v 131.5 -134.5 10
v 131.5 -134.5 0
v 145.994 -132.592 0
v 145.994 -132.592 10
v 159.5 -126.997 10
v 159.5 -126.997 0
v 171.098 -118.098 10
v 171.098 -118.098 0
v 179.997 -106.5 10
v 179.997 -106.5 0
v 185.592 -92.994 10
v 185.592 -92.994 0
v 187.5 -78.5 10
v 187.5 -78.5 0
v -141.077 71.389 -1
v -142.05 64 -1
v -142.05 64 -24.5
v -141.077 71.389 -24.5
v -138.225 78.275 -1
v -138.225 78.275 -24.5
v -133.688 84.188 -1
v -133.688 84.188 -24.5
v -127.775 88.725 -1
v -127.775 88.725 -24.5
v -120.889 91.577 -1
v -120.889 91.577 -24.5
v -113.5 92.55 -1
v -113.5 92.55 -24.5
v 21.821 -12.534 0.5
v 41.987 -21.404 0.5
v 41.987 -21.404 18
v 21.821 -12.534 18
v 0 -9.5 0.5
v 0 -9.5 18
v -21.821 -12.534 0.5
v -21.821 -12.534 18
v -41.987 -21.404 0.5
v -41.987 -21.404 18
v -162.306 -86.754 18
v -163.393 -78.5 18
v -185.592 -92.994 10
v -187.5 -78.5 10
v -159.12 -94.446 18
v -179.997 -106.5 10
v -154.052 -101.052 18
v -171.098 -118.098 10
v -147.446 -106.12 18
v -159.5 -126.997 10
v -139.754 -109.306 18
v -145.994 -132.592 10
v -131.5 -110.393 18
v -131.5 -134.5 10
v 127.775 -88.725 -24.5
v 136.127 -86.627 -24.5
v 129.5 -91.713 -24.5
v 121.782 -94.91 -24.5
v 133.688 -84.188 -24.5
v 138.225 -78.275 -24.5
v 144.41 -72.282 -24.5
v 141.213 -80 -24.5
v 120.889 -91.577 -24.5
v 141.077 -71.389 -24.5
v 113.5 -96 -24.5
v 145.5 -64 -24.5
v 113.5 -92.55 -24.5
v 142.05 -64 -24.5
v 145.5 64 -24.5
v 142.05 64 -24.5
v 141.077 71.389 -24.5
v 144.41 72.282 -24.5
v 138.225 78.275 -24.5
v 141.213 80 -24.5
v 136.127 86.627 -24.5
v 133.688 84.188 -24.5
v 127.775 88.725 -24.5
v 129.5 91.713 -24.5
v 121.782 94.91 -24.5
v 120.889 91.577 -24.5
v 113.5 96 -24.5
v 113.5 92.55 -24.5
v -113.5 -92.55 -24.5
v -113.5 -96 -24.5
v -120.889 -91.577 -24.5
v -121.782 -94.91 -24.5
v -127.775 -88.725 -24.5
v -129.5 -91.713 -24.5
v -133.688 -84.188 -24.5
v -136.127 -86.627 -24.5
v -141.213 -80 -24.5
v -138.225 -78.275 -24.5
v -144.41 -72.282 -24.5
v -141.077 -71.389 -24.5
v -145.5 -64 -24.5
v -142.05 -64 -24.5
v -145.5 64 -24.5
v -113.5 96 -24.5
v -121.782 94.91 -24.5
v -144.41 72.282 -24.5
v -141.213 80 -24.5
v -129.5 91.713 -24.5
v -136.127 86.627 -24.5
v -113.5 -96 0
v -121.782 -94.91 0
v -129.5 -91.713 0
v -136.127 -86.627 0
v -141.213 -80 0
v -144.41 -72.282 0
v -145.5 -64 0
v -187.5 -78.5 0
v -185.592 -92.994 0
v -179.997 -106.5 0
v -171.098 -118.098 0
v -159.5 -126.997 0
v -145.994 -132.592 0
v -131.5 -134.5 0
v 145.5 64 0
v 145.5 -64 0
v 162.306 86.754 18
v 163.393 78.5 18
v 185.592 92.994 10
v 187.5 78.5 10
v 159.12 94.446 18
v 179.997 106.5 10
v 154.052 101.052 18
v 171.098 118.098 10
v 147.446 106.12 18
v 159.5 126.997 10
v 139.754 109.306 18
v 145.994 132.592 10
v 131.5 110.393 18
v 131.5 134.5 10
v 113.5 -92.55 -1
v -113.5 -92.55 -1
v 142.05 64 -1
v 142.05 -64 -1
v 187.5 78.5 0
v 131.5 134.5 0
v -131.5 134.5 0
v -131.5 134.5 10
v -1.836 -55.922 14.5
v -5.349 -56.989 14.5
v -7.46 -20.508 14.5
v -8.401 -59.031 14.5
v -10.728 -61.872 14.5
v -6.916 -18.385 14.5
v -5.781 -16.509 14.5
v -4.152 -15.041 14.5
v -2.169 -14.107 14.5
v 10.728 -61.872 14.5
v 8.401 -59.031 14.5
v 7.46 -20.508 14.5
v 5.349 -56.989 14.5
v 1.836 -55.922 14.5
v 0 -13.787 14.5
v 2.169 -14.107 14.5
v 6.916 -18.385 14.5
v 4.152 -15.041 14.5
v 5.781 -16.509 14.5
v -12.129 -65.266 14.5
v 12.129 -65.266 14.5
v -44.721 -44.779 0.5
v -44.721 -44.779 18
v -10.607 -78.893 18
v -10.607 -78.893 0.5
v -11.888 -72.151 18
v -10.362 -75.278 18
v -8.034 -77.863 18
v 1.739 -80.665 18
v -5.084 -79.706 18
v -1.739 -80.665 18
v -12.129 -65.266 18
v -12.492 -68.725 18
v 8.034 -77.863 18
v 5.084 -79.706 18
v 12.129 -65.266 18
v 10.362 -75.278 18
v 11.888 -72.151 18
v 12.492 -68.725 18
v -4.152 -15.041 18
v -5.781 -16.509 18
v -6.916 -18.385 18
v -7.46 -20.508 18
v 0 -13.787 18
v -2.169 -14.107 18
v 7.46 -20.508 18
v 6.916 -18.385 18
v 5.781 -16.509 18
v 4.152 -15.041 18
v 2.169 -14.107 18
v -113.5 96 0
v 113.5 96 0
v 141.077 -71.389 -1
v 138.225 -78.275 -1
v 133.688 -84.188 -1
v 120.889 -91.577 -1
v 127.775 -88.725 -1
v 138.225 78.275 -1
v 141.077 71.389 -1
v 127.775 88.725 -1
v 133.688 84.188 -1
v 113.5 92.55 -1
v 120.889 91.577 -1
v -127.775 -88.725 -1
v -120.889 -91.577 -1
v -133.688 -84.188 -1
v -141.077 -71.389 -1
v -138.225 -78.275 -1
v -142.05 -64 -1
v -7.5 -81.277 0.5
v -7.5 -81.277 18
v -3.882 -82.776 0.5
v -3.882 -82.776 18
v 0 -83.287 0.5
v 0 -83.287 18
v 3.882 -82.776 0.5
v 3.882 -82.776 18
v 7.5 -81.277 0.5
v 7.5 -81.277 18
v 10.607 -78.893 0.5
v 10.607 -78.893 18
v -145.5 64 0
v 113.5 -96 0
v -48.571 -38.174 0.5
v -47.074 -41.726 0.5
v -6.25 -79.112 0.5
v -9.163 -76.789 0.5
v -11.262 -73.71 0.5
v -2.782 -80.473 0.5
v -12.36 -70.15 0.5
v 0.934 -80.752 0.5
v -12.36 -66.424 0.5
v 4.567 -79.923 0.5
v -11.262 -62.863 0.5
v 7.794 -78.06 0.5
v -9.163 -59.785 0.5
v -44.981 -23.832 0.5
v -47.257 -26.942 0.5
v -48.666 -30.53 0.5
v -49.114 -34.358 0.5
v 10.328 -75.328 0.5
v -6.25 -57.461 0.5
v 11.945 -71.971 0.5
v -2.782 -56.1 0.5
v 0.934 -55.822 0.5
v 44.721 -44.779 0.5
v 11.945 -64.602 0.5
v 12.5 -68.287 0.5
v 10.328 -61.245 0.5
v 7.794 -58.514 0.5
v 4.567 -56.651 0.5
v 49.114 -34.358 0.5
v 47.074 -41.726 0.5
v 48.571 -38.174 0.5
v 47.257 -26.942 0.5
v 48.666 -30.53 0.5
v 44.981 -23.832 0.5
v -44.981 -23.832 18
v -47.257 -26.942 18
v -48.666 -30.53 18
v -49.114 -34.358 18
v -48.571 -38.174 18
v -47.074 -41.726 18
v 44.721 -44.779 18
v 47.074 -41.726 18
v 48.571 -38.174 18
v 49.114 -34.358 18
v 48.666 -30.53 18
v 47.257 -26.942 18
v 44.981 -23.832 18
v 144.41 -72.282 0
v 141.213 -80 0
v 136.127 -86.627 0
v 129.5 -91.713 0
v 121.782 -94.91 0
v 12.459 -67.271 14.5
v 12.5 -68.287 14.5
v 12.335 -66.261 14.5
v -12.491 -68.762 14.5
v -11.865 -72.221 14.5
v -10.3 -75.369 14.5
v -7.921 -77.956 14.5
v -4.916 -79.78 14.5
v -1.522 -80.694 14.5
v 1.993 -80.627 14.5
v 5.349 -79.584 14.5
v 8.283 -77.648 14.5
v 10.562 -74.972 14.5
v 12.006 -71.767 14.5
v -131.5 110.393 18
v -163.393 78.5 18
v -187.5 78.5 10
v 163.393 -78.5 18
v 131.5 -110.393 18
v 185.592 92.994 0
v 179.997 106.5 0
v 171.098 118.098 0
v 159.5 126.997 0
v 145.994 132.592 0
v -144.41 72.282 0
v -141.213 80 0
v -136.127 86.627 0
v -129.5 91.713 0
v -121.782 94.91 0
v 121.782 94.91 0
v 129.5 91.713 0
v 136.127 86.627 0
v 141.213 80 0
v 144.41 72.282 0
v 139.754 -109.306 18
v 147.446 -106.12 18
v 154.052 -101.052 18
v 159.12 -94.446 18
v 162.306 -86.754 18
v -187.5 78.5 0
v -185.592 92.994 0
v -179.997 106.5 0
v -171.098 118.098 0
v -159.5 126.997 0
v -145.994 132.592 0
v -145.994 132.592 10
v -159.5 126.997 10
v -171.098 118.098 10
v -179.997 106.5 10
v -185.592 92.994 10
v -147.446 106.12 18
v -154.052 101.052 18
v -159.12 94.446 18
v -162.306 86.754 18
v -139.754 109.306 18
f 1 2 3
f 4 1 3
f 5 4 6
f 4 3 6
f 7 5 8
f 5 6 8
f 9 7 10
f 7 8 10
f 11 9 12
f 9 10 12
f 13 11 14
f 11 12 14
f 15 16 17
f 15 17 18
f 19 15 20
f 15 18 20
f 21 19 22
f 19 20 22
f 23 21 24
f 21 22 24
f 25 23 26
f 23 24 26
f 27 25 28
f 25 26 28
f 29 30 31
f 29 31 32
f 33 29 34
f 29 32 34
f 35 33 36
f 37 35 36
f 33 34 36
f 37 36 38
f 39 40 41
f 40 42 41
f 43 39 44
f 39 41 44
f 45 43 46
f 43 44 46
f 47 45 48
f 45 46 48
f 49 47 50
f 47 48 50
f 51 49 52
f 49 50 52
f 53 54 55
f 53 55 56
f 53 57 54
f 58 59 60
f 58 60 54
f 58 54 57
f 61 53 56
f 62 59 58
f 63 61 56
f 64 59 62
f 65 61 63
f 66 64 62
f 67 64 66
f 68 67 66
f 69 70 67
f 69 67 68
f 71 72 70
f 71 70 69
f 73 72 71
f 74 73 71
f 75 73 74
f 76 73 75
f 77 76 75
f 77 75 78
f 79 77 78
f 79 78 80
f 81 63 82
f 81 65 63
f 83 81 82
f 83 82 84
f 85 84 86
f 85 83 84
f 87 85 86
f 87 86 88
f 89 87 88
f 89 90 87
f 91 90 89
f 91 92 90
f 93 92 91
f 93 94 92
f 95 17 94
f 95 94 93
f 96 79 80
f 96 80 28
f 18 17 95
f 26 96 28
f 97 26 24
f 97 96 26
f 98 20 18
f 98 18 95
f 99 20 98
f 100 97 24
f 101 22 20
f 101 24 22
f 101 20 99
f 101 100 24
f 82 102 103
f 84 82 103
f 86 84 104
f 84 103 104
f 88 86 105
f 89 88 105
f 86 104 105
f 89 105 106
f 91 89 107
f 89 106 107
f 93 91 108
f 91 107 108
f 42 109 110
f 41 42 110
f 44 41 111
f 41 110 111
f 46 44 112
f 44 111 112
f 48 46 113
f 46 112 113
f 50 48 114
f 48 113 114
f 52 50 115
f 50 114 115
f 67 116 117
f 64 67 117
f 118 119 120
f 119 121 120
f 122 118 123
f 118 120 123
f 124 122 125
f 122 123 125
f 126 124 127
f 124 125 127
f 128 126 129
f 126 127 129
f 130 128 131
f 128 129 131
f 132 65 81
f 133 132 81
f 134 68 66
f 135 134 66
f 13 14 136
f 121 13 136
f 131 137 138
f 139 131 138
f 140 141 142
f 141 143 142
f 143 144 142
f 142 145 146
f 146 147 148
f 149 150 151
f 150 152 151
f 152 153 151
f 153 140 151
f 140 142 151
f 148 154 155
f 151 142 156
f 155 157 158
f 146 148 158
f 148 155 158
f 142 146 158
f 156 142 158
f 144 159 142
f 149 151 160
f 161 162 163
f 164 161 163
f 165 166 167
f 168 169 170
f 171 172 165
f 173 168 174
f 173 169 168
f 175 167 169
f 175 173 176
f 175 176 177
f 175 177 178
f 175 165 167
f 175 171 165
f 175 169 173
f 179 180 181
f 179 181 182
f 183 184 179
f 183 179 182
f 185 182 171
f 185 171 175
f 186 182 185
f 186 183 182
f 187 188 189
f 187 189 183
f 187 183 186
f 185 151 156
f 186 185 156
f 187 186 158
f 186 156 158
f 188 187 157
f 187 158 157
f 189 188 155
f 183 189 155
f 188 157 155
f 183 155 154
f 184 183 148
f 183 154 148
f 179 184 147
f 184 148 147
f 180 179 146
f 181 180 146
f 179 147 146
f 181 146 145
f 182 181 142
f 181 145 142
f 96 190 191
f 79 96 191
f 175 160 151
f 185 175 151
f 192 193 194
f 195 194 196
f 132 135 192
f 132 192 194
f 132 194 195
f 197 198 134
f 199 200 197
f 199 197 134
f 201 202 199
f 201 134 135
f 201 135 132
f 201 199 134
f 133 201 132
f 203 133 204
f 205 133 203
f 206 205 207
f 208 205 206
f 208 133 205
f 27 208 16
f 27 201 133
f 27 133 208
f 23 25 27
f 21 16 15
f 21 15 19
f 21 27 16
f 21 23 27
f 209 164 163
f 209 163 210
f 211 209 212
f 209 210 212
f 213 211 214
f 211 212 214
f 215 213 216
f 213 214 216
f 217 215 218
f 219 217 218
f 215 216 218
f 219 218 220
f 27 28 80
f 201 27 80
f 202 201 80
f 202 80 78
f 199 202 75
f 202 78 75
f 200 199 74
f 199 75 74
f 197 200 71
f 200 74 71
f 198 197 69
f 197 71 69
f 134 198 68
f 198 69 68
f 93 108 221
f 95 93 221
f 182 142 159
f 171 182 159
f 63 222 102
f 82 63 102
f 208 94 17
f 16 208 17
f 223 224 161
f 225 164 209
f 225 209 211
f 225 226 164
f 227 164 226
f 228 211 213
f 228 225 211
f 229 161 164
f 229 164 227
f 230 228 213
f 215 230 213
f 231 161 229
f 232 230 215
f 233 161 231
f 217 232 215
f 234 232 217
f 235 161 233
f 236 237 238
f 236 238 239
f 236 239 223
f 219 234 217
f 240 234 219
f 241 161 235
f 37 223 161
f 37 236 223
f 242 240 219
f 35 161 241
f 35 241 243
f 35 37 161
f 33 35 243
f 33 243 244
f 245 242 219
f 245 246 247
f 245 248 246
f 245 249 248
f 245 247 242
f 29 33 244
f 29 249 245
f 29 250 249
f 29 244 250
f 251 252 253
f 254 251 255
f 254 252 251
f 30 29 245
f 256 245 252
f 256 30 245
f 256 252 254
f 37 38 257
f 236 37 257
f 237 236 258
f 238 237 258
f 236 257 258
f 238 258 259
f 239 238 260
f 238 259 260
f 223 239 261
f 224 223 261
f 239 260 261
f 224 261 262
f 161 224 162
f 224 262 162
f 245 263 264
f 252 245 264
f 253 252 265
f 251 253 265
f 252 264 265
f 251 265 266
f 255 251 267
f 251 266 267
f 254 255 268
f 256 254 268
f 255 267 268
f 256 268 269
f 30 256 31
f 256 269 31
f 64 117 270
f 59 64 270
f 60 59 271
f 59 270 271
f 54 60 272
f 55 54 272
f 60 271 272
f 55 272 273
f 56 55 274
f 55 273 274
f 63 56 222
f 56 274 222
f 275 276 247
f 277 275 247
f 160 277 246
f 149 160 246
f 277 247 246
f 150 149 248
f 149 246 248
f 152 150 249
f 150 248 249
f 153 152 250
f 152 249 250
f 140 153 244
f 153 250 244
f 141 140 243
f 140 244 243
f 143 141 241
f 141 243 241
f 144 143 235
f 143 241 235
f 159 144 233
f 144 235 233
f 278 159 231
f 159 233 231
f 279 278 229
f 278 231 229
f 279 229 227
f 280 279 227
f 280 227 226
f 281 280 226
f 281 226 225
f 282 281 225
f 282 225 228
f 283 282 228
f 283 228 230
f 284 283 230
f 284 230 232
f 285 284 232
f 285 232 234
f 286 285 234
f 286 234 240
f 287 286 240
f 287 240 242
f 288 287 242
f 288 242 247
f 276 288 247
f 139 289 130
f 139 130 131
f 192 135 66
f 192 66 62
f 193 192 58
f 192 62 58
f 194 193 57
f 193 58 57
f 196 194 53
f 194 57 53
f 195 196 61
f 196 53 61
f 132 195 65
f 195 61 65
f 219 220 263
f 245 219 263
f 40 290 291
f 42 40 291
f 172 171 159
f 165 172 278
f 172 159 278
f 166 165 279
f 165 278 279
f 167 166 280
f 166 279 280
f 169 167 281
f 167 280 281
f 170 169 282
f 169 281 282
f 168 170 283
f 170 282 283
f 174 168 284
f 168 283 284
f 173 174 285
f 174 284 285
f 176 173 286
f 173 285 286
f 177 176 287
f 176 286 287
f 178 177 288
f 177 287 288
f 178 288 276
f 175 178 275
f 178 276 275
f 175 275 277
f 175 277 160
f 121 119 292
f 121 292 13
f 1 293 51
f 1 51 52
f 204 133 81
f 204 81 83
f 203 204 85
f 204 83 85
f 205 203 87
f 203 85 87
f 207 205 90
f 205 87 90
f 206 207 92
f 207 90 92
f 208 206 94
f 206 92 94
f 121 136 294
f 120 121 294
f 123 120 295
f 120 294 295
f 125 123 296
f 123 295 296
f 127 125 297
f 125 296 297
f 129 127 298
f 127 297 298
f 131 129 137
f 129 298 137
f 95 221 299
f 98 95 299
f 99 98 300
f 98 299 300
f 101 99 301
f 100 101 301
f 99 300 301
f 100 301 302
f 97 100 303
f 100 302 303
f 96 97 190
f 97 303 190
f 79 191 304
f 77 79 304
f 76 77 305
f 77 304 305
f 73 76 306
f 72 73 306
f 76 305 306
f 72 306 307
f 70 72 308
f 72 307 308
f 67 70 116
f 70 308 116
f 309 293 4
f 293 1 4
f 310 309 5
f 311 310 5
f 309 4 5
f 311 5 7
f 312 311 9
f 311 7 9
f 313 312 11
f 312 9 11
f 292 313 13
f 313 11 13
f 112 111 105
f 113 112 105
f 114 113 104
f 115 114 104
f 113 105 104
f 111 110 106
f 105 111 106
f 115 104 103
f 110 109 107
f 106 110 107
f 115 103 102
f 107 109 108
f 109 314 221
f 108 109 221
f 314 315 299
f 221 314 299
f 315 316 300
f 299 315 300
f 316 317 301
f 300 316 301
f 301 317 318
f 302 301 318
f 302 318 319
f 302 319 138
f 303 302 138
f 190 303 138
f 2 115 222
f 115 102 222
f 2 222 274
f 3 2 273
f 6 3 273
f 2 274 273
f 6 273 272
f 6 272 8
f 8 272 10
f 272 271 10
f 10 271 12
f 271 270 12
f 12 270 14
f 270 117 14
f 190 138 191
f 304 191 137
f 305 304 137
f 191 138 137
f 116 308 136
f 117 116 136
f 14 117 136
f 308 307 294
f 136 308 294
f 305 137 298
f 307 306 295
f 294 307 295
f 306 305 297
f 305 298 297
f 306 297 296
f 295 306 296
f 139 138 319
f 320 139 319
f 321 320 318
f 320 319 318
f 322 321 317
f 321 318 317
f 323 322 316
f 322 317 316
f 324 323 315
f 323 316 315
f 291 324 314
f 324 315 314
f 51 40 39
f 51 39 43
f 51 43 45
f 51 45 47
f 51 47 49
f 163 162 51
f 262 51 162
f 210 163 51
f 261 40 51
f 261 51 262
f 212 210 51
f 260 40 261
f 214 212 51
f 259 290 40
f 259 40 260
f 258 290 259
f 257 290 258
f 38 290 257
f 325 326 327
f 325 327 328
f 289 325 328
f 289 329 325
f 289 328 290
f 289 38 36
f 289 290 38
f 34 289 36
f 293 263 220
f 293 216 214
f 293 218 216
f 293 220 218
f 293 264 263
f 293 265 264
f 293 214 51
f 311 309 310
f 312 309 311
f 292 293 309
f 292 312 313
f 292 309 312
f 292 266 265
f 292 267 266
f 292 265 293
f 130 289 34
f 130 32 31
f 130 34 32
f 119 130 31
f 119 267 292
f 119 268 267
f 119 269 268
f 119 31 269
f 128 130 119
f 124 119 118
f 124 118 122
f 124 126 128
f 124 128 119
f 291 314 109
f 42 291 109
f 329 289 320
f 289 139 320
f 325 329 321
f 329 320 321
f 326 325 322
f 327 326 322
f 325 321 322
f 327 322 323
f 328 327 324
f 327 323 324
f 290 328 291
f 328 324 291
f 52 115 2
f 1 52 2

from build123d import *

# Parameters (mm, degrees)
BOSS_EXTRUDE1_DEPTH = 18
BOSS_EXTRUDE2_DEPTH = 24.5
CUT_EXTRUDE1_DEPTH  = 17.5
SKETCH6_R           = 12.5
BOSS_EXTRUDE3_DEPTH = 14
BOSS_EXTRUDE4_DEPTH = 3.5
CUT_EXTRUDE6_DEPTH  = 23.5


with BuildPart() as part:
    # Sketch1 → Boss-Extrude1 (new body)
    with BuildSketch(Plane.XY):
        with BuildLine():
            Line((-131.5, -134.5), (131.5, -134.5))
            ThreePointArc((131.5, -134.5), (171.097979746, -118.097979746), (187.5, -78.5))
            Line((187.5, -78.5), (187.5, 78.5))
            ThreePointArc((187.5, 78.5), (171.097979746, 118.097979746), (131.5, 134.5))
            Line((131.5, 134.5), (-131.5, 134.5))
            ThreePointArc((-131.5, 134.5), (-171.097979746, 118.097979746), (-187.5, 78.5))
            Line((-187.5, 78.5), (-187.5, -78.5))
            ThreePointArc((-187.5, -78.5), (-171.097979746, -118.097979746), (-131.5, -134.5))
        make_face()
    extrude(amount=BOSS_EXTRUDE1_DEPTH)

    # Cut-Sweep1: sweep along a path in Sketch3
    with BuildLine(Plane.XY.offset(18)) as cut_sweep1_path:
        Line((131.5, 134.5), (-131.5, 134.5))
        ThreePointArc((-131.5, 134.5), (-171.097979746, 118.097979746), (-187.5, 78.5))
        Line((-187.5, 78.5), (-187.5, -78.5))
        ThreePointArc((-187.5, -78.5), (-171.097979746, -118.097979746), (-131.5, -134.5))
        Line((-131.5, -134.5), (131.5, -134.5))
        ThreePointArc((131.5, -134.5), (171.097979746, -118.097979746), (187.5, -78.5))
        Line((187.5, -78.5), (187.5, 78.5))
        ThreePointArc((187.5, 78.5), (171.097979746, 118.097979746), (131.5, 134.5))
    # Sketch2 → Cut-Sweep1 (sweep, cut)
    with BuildSketch(Plane(origin=(0, 0, 0), x_dir=(0, 0, -1), z_dir=(1, 0, 0))):
        Polygon((-18, 110.392739683), (-10, 134.5), (-18, 134.5), align=None)
    sweep(path=cut_sweep1_path.line, mode=Mode.SUBTRACT)

    # Sketch4 → Boss-Extrude2 (add)
    with BuildSketch(Plane(origin=(0, 0, 0), x_dir=(-1, 0, 0), z_dir=(0, 0, -1))):
        with BuildLine():
            Line((113.5, 96), (-113.5, 96))
            ThreePointArc((-113.5, 96), (-136.127416998, 86.627416998), (-145.5, 64))
            Line((-145.5, 64), (-145.5, -64))
            ThreePointArc((-145.5, -64), (-136.127416998, -86.627416998), (-113.5, -96))
            Line((-113.5, -96), (113.5, -96))
            ThreePointArc((113.5, -96), (136.127416998, -86.627416998), (145.5, -64))
            Line((145.5, -64), (145.5, 64))
            ThreePointArc((145.5, 64), (136.127416998, 86.627416998), (113.5, 96))
        make_face()
    extrude(amount=BOSS_EXTRUDE2_DEPTH)

    # Sketch5 → Cut-Extrude1 (cut)
    with BuildSketch(Plane.XY.offset(18)):
        with BuildLine():
            Line((10.606601718, -78.893398282), (44.72135955, -44.77864045))
            ThreePointArc((44.72135955, -44.77864045), (49.01319592, -32.429470934), (41.987394255, -21.40404767))
            ThreePointArc((41.987394255, -21.40404767), (0, -9.5), (-41.987394255, -21.40404767))
            ThreePointArc((-41.987394255, -21.40404767), (-49.01319592, -32.429470934), (-44.72135955, -44.77864045))
            Line((-44.72135955, -44.77864045), (-10.606601718, -78.893398282))
            ThreePointArc((-10.606601718, -78.893398282), (0, -83.286796564), (10.606601718, -78.893398282))
        make_face()
    extrude(amount=-CUT_EXTRUDE1_DEPTH, mode=Mode.SUBTRACT)

    # Sketch6 → Boss-Extrude3 (add)
    with BuildSketch(Plane.XY.offset(0.5)):
        with Locations((0, -68.286796564)):
            Circle(SKETCH6_R)
    extrude(amount=BOSS_EXTRUDE3_DEPTH)

    # Sketch7 → Boss-Extrude4 (add)
    with BuildSketch(Plane.XY.offset(14.5)):
        with BuildLine():
            Line((-7.459505989, -20.508484033), (-12.129381177, -65.265519969))
            ThreePointArc((-12.129381177, -65.265519969), (0, -80.786796564), (12.129381177, -65.265519969))
            Line((12.129381177, -65.265519969), (7.459505989, -20.508484033))
            ThreePointArc((7.459505989, -20.508484033), (0, -13.786796564), (-7.459505989, -20.508484033))
        make_face()
    extrude(amount=BOSS_EXTRUDE4_DEPTH)

    # Sketch9 → Cut-Extrude6 (cut)
    with BuildSketch(Plane(origin=(0, 0, -24.5), x_dir=(-1, 0, 0), z_dir=(0, 0, -1))):
        with BuildLine():
            Line((113.5, 92.55), (-113.5, 92.55))
            ThreePointArc((-113.5, 92.55), (-133.687898603, 84.187898603), (-142.05, 64))
            Line((-142.05, 64), (-142.05, -64))
            ThreePointArc((-142.05, -64), (-133.687898603, -84.187898603), (-113.5, -92.55))
            Line((-113.5, -92.55), (113.5, -92.55))
            ThreePointArc((113.5, -92.55), (133.687898603, -84.187898603), (142.05, -64))
            Line((142.05, -64), (142.05, 64))
            ThreePointArc((142.05, 64), (133.687898603, 84.187898603), (113.5, 92.55))
        make_face()
    extrude(amount=-CUT_EXTRUDE6_DEPTH, mode=Mode.SUBTRACT)


solid = part.part
